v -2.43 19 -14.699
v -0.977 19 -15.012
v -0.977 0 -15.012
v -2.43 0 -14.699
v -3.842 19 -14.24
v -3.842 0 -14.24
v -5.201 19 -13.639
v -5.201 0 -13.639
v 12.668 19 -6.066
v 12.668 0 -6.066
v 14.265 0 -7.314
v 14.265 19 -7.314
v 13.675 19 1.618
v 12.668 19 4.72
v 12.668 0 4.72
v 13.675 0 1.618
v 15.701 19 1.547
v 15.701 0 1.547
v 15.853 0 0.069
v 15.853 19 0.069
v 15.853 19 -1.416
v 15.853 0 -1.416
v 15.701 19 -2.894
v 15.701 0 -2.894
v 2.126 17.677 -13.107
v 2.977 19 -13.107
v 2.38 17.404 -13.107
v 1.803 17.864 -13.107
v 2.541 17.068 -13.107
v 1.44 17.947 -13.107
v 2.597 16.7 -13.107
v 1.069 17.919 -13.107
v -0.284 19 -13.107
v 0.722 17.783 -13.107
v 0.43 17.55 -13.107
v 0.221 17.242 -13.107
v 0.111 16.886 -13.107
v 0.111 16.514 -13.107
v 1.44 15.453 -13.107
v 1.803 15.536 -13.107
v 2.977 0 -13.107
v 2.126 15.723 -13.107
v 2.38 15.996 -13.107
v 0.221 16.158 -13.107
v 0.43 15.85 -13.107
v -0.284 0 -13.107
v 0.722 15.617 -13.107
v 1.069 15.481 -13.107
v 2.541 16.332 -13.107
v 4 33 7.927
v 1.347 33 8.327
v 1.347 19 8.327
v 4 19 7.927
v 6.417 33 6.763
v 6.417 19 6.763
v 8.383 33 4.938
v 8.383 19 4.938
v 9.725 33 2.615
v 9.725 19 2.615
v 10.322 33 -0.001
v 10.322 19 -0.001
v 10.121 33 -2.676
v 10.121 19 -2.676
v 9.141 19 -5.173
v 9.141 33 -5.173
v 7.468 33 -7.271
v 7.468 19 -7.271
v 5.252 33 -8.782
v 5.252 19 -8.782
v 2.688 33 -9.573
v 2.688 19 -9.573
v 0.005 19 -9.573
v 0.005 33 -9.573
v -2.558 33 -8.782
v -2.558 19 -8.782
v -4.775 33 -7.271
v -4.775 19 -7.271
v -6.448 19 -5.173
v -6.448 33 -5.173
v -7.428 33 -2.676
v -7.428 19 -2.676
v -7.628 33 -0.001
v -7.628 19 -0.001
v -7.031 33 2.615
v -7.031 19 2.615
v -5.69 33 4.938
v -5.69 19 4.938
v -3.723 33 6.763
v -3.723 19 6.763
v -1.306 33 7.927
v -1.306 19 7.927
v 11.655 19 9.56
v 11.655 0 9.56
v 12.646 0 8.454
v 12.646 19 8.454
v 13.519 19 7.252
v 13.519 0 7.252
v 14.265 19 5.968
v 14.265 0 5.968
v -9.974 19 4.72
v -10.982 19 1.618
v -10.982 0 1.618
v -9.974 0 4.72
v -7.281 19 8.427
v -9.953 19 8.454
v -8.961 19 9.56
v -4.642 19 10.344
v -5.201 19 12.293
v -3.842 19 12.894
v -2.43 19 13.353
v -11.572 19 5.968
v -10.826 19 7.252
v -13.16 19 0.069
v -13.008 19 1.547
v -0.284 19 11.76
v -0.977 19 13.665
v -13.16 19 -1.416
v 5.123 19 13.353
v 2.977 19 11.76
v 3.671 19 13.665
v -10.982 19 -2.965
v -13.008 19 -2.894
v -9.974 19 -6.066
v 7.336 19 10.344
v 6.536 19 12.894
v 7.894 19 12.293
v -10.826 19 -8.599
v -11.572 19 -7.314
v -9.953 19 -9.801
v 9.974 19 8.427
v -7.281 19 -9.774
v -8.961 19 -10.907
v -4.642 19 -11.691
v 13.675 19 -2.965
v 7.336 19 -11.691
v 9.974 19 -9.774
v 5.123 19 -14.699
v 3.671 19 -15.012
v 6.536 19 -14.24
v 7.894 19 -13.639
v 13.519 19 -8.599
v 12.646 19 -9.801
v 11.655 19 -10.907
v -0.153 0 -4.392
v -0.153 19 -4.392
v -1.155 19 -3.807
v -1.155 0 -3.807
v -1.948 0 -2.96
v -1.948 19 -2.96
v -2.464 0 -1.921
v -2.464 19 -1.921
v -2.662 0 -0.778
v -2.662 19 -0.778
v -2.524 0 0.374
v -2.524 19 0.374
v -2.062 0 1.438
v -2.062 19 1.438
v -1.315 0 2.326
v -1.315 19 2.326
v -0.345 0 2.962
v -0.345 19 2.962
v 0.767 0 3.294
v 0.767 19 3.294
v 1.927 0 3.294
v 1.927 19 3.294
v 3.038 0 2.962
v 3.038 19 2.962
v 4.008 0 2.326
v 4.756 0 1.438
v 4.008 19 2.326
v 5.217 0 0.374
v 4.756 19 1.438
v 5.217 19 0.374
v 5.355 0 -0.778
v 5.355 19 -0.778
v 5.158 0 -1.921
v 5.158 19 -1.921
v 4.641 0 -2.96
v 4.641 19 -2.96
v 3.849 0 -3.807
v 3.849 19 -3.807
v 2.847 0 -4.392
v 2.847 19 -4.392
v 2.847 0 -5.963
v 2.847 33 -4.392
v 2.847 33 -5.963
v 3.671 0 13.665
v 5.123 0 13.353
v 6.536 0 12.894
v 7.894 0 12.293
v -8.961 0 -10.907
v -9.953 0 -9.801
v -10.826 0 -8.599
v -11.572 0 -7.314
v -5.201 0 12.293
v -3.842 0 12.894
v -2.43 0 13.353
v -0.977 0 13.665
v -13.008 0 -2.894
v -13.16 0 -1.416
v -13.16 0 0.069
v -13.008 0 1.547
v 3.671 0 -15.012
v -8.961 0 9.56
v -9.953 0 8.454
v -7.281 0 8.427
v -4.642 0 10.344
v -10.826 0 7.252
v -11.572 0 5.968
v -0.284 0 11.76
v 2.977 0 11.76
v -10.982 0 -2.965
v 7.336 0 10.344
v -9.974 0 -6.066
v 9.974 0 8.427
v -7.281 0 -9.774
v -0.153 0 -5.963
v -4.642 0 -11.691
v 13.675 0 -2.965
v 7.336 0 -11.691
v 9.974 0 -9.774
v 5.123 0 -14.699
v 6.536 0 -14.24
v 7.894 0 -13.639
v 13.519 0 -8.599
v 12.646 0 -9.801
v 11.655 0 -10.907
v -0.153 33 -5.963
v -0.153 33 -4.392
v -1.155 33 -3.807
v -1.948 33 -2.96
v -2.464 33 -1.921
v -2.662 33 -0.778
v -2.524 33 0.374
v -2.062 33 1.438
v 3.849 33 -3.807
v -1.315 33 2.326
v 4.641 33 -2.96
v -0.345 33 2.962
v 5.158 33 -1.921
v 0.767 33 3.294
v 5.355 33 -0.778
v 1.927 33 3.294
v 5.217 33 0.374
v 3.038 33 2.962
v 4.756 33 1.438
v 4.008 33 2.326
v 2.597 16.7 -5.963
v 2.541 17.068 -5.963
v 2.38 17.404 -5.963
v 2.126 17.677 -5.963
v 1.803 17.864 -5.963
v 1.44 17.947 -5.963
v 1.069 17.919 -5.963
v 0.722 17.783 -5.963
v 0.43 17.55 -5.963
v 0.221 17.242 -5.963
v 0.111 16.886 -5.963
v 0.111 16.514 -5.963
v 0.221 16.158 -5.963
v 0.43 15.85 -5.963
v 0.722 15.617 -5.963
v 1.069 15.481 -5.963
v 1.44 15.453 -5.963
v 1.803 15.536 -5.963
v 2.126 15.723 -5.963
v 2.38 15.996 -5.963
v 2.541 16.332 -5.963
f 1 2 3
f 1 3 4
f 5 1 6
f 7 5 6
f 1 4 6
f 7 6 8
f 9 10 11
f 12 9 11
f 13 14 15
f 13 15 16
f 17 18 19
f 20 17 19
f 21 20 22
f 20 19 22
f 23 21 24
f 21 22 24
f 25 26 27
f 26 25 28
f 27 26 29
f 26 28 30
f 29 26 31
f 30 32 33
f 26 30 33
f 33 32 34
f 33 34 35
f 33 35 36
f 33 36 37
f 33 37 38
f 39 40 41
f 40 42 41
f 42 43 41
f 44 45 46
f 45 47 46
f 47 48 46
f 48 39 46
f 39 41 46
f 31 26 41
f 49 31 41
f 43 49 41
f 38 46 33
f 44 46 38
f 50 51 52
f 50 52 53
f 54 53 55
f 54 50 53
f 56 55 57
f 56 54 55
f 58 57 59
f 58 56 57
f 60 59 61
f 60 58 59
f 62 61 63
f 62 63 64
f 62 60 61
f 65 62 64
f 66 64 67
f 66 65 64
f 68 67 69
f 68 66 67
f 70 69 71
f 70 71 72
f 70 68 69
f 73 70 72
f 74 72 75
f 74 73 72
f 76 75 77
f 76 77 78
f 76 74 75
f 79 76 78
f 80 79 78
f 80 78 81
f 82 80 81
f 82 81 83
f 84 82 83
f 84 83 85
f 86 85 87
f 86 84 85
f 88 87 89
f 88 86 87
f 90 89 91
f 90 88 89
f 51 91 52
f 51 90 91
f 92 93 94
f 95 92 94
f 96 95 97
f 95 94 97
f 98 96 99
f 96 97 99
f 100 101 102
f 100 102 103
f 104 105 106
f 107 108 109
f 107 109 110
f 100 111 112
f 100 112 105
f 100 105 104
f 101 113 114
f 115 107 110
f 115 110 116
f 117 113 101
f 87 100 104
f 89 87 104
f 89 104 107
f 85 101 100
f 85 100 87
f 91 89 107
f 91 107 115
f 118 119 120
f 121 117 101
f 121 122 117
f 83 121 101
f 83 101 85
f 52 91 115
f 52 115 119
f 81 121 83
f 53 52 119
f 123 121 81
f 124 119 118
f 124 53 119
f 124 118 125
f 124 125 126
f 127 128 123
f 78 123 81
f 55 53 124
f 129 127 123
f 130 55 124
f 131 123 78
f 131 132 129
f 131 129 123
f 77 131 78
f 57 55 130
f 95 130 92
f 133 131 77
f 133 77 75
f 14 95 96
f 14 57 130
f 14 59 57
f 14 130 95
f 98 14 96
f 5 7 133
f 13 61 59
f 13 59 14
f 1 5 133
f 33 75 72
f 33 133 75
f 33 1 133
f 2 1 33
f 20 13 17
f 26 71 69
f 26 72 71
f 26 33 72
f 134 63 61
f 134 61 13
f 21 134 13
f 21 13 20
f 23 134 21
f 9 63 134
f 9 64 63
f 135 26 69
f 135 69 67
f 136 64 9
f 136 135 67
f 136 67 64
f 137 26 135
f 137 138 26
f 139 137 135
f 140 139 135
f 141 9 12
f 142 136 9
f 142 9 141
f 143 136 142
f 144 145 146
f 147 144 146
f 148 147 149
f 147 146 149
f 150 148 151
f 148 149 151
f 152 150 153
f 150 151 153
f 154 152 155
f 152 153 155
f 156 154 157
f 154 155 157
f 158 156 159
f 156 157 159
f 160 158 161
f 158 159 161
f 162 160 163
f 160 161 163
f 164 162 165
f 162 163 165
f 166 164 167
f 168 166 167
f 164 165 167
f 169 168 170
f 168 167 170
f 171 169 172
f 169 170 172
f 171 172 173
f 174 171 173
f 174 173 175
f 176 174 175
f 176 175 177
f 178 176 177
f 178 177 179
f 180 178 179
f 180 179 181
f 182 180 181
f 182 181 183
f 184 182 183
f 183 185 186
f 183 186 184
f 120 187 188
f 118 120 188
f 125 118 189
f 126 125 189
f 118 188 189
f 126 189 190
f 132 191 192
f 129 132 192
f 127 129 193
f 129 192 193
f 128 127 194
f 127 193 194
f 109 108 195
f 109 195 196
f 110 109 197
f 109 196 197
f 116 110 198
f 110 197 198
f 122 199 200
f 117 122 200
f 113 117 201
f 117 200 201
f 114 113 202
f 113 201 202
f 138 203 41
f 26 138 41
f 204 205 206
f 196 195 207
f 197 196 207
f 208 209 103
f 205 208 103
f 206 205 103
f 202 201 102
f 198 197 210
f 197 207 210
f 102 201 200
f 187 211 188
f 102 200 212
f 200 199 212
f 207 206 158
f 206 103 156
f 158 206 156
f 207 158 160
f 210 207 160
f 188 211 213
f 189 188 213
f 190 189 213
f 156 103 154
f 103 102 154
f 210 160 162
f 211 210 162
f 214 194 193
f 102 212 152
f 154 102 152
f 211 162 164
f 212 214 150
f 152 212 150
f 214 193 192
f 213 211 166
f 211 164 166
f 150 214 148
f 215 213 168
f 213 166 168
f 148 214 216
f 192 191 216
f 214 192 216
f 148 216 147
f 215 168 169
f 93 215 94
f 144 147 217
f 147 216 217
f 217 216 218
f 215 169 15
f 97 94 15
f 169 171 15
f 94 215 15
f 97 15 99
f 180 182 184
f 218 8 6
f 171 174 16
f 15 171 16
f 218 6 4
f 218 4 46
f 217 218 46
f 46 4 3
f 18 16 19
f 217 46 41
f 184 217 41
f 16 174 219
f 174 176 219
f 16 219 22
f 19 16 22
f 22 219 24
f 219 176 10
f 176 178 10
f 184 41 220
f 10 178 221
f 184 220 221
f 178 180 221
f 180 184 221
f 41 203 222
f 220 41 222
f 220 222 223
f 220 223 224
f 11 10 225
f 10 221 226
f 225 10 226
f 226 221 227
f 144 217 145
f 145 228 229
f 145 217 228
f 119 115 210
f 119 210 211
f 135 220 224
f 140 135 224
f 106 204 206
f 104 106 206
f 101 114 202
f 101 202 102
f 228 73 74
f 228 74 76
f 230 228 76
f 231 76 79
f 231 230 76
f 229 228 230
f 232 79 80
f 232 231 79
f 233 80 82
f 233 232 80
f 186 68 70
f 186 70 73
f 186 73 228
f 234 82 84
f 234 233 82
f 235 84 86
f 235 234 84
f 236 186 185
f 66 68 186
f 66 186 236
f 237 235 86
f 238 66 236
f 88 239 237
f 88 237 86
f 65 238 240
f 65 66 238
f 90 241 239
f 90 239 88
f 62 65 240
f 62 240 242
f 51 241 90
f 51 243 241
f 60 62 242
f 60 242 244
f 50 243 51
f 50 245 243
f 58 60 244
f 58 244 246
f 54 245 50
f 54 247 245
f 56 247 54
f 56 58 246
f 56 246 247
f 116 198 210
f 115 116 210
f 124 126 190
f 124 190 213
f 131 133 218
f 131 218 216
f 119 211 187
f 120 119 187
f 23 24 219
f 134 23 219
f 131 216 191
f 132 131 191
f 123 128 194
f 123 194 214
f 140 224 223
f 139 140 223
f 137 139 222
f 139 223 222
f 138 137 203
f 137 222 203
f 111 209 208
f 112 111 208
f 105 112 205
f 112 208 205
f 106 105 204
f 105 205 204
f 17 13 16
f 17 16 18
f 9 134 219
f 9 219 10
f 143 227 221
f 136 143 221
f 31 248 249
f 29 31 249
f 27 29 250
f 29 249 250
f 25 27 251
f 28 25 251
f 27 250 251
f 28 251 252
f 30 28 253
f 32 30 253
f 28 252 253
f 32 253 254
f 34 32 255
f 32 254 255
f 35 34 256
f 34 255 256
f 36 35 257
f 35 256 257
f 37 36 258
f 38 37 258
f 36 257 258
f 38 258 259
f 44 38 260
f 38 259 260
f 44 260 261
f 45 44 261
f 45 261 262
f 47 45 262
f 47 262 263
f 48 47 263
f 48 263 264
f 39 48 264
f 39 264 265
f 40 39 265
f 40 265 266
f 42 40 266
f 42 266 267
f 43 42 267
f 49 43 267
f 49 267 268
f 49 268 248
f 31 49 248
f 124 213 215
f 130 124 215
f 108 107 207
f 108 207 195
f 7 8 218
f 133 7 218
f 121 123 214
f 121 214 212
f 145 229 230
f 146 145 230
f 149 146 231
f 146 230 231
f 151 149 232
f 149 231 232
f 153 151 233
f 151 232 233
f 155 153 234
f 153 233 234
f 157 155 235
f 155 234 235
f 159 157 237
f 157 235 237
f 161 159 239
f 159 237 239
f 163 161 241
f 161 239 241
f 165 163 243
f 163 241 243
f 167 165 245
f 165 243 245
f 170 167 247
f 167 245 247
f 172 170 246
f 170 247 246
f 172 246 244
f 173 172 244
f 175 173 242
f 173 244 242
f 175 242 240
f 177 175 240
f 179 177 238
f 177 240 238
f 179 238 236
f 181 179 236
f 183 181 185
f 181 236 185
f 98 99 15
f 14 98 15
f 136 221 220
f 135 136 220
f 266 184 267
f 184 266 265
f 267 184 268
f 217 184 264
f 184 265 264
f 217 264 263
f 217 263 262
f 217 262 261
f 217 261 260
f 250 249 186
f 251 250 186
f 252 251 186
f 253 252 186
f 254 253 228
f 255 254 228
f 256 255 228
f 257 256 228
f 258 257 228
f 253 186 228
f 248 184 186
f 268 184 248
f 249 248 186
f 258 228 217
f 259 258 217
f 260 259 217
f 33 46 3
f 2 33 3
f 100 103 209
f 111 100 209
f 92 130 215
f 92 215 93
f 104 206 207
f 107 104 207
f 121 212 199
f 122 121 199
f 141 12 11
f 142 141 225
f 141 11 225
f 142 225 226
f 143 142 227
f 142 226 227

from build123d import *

# Parameters (mm, degrees)
BOSS_EXTRUDE1_DEPTH       = 19
SKETCH3_R                 = 4.01
CUT_EXTRUDE1_DEPTH        = 29.952983186
SKETCH4_W                 = 3
SKETCH4_H                 = 4.35070692
CUT_EXTRUDE2_DEPTH        = 29.952983186
BOSS_EXTRUDE2_START       = 14
SKETCH5_R                 = 9
BOSS_EXTRUDE2_DEPTH       = 14
M3X0_5_TAPPED_HOLE1_D     = 2.5
M3X0_5_TAPPED_HOLE1_DEPTH = 10
M3X0_5_TAPPED_HOLE1_TIP   = 0.751075774


with BuildPart() as part:
    # Sketch2 → Boss-Extrude1 (new body)
    with BuildSketch(Plane(origin=(0, 0, 0), x_dir=(1, 0, 0), z_dir=(0, 1, 0))):
        with BuildLine():
            Line((7.335535963, -10.343914335), (9.974123377, -8.426868365))
            Line((9.974123377, -8.426868365), (11.654796972, -9.560497019))
            ThreePointArc((11.654796972, -9.560497019), (13.098043776, -7.864477351), (14.265066544, -5.967769174))
            Line((14.265066544, -5.967769174), (12.667564922, -4.719664118))
            Line((12.667564922, -4.719664118), (13.675415632, -1.617818581))
            Line((13.675415632, -1.617818581), (15.701439337, -1.547068275))
            ThreePointArc((15.701439337, -1.547068275), (15.87215518, 0.673359646), (15.701439337, 2.893787567))
            Line((15.701439337, 2.893787567), (13.675415632, 2.964537874))
            Line((13.675415632, 2.964537874), (12.667564922, 6.066383411))
            Line((12.667564922, 6.066383411), (14.265066544, 7.314488466))
            ThreePointArc((14.265066544, 7.314488466), (13.098043776, 9.211196644), (11.654796972, 10.907216312))
            Line((11.654796972, 10.907216312), (9.974123377, 9.773587658))
            Line((9.974123377, 9.773587658), (7.335535963, 11.690633627))
            Line((7.335535963, 11.690633627), (7.894324179, 13.639359722))
            ThreePointArc((7.894324179, 13.639359722), (5.835325832, 14.487870099), (3.670819293, 15.011659646))
            Line((3.670819293, 15.011659646), (2.977455996, 13.106659646))
            Line((2.977455996, 13.106659646), (-0.284017411, 13.106659646))
            Line((-0.284017411, 13.106659646), (-0.977380707, 15.011659646))
            ThreePointArc((-0.977380707, 15.011659646), (-3.141887247, 14.487870099), (-5.200885594, 13.639359722))
            Line((-5.200885594, 13.639359722), (-4.642097378, 11.690633627))
            Line((-4.642097378, 11.690633627), (-7.280684791, 9.773587658))
            Line((-7.280684791, 9.773587658), (-8.961358387, 10.907216312))
            ThreePointArc((-8.961358387, 10.907216312), (-10.40460519, 9.211196644), (-11.571627958, 7.314488466))
            Line((-11.571627958, 7.314488466), (-9.974126336, 6.066383411))
            Line((-9.974126336, 6.066383411), (-10.981977046, 2.964537874))
            Line((-10.981977046, 2.964537874), (-13.008000751, 2.893787567))
            ThreePointArc((-13.008000751, 2.893787567), (-13.178716594, 0.673359646), (-13.008000751, -1.547068275))
            Line((-13.008000751, -1.547068275), (-10.981977046, -1.617818581))
            Line((-10.981977046, -1.617818581), (-9.974126336, -4.719664118))
            Line((-9.974126336, -4.719664118), (-11.571627958, -5.967769174))
            ThreePointArc((-11.571627958, -5.967769174), (-10.40460519, -7.864477351), (-8.961358387, -9.560497019))
            Line((-8.961358387, -9.560497019), (-7.280684791, -8.426868365))
            Line((-7.280684791, -8.426868365), (-4.642097378, -10.343914335))
            Line((-4.642097378, -10.343914335), (-5.200885594, -12.292640429))
            ThreePointArc((-5.200885594, -12.292640429), (-3.141887247, -13.141150806), (-0.977380707, -13.664940354))
            Line((-0.977380707, -13.664940354), (-0.284017411, -11.759940354))
            Line((-0.284017411, -11.759940354), (2.977455996, -11.759940354))
            Line((2.977455996, -11.759940354), (3.670819293, -13.664940354))
            ThreePointArc((3.670819293, -13.664940354), (5.835325832, -13.141150806), (7.894324179, -12.292640429))
            Line((7.894324179, -12.292640429), (7.335535963, -10.343914335))
        make_face()
    extrude(amount=BOSS_EXTRUDE1_DEPTH)

    # Sketch3 → Cut-Extrude1 (cut, through all)
    with BuildSketch(Plane(origin=(0, 19, 0), x_dir=(1, 0, 0), z_dir=(0, 1, 0))):
        with Locations(Location((1.346719293, 0.673359646, 0), (0, 0, 270))):
            Circle(SKETCH3_R)
    extrude(amount=-CUT_EXTRUDE1_DEPTH, mode=Mode.SUBTRACT)

    # Sketch4 → Cut-Extrude2 (cut, through all)
    with BuildSketch(Plane(origin=(0, 19, 0), x_dir=(1, 0, 0), z_dir=(0, 1, 0))):
        with Locations((1.346719293, 3.788006186)):
            Rectangle(SKETCH4_W, SKETCH4_H)
    extrude(amount=-CUT_EXTRUDE2_DEPTH, mode=Mode.SUBTRACT)

    # Sketch5 → Boss-Extrude2 (add)
    with BuildSketch(Plane(origin=(0, 19, 0), x_dir=(1, 0, 0), z_dir=(0, 1, 0)).offset(BOSS_EXTRUDE2_START)):
        with Locations(Location((1.346719293, 0.673359646, 0), (0, 0, 270))):
            Circle(SKETCH5_R)
        with BuildLine():
            Line((2.846719293, 4.392243888), (2.846719293, 5.963359646))
            Line((2.846719293, 5.963359646), (-0.153280707, 5.963359646))
            Line((-0.153280707, 5.963359646), (-0.153280707, 4.392243888))
            ThreePointArc((-0.153280707, 4.392243888), (1.346719293, -3.336640354), (2.846719293, 4.392243888))
        make_face(mode=Mode.SUBTRACT)
    extrude(amount=-BOSS_EXTRUDE2_DEPTH)

    # M3x0.5 Tapped Hole1
    with Locations(Plane(origin=(1.346719293, 16.7, -13.106659646), x_dir=(-1, 0, 0), z_dir=(0, 0, -1))):
        with Locations((0, 0)):
            Hole(M3X0_5_TAPPED_HOLE1_D / 2, depth=M3X0_5_TAPPED_HOLE1_DEPTH)
            with Locations((0, 0, -(M3X0_5_TAPPED_HOLE1_DEPTH + M3X0_5_TAPPED_HOLE1_TIP / 2))):  # 118° drill point
                Cone(0, M3X0_5_TAPPED_HOLE1_D / 2, M3X0_5_TAPPED_HOLE1_TIP, mode=Mode.SUBTRACT)


solid = part.part
